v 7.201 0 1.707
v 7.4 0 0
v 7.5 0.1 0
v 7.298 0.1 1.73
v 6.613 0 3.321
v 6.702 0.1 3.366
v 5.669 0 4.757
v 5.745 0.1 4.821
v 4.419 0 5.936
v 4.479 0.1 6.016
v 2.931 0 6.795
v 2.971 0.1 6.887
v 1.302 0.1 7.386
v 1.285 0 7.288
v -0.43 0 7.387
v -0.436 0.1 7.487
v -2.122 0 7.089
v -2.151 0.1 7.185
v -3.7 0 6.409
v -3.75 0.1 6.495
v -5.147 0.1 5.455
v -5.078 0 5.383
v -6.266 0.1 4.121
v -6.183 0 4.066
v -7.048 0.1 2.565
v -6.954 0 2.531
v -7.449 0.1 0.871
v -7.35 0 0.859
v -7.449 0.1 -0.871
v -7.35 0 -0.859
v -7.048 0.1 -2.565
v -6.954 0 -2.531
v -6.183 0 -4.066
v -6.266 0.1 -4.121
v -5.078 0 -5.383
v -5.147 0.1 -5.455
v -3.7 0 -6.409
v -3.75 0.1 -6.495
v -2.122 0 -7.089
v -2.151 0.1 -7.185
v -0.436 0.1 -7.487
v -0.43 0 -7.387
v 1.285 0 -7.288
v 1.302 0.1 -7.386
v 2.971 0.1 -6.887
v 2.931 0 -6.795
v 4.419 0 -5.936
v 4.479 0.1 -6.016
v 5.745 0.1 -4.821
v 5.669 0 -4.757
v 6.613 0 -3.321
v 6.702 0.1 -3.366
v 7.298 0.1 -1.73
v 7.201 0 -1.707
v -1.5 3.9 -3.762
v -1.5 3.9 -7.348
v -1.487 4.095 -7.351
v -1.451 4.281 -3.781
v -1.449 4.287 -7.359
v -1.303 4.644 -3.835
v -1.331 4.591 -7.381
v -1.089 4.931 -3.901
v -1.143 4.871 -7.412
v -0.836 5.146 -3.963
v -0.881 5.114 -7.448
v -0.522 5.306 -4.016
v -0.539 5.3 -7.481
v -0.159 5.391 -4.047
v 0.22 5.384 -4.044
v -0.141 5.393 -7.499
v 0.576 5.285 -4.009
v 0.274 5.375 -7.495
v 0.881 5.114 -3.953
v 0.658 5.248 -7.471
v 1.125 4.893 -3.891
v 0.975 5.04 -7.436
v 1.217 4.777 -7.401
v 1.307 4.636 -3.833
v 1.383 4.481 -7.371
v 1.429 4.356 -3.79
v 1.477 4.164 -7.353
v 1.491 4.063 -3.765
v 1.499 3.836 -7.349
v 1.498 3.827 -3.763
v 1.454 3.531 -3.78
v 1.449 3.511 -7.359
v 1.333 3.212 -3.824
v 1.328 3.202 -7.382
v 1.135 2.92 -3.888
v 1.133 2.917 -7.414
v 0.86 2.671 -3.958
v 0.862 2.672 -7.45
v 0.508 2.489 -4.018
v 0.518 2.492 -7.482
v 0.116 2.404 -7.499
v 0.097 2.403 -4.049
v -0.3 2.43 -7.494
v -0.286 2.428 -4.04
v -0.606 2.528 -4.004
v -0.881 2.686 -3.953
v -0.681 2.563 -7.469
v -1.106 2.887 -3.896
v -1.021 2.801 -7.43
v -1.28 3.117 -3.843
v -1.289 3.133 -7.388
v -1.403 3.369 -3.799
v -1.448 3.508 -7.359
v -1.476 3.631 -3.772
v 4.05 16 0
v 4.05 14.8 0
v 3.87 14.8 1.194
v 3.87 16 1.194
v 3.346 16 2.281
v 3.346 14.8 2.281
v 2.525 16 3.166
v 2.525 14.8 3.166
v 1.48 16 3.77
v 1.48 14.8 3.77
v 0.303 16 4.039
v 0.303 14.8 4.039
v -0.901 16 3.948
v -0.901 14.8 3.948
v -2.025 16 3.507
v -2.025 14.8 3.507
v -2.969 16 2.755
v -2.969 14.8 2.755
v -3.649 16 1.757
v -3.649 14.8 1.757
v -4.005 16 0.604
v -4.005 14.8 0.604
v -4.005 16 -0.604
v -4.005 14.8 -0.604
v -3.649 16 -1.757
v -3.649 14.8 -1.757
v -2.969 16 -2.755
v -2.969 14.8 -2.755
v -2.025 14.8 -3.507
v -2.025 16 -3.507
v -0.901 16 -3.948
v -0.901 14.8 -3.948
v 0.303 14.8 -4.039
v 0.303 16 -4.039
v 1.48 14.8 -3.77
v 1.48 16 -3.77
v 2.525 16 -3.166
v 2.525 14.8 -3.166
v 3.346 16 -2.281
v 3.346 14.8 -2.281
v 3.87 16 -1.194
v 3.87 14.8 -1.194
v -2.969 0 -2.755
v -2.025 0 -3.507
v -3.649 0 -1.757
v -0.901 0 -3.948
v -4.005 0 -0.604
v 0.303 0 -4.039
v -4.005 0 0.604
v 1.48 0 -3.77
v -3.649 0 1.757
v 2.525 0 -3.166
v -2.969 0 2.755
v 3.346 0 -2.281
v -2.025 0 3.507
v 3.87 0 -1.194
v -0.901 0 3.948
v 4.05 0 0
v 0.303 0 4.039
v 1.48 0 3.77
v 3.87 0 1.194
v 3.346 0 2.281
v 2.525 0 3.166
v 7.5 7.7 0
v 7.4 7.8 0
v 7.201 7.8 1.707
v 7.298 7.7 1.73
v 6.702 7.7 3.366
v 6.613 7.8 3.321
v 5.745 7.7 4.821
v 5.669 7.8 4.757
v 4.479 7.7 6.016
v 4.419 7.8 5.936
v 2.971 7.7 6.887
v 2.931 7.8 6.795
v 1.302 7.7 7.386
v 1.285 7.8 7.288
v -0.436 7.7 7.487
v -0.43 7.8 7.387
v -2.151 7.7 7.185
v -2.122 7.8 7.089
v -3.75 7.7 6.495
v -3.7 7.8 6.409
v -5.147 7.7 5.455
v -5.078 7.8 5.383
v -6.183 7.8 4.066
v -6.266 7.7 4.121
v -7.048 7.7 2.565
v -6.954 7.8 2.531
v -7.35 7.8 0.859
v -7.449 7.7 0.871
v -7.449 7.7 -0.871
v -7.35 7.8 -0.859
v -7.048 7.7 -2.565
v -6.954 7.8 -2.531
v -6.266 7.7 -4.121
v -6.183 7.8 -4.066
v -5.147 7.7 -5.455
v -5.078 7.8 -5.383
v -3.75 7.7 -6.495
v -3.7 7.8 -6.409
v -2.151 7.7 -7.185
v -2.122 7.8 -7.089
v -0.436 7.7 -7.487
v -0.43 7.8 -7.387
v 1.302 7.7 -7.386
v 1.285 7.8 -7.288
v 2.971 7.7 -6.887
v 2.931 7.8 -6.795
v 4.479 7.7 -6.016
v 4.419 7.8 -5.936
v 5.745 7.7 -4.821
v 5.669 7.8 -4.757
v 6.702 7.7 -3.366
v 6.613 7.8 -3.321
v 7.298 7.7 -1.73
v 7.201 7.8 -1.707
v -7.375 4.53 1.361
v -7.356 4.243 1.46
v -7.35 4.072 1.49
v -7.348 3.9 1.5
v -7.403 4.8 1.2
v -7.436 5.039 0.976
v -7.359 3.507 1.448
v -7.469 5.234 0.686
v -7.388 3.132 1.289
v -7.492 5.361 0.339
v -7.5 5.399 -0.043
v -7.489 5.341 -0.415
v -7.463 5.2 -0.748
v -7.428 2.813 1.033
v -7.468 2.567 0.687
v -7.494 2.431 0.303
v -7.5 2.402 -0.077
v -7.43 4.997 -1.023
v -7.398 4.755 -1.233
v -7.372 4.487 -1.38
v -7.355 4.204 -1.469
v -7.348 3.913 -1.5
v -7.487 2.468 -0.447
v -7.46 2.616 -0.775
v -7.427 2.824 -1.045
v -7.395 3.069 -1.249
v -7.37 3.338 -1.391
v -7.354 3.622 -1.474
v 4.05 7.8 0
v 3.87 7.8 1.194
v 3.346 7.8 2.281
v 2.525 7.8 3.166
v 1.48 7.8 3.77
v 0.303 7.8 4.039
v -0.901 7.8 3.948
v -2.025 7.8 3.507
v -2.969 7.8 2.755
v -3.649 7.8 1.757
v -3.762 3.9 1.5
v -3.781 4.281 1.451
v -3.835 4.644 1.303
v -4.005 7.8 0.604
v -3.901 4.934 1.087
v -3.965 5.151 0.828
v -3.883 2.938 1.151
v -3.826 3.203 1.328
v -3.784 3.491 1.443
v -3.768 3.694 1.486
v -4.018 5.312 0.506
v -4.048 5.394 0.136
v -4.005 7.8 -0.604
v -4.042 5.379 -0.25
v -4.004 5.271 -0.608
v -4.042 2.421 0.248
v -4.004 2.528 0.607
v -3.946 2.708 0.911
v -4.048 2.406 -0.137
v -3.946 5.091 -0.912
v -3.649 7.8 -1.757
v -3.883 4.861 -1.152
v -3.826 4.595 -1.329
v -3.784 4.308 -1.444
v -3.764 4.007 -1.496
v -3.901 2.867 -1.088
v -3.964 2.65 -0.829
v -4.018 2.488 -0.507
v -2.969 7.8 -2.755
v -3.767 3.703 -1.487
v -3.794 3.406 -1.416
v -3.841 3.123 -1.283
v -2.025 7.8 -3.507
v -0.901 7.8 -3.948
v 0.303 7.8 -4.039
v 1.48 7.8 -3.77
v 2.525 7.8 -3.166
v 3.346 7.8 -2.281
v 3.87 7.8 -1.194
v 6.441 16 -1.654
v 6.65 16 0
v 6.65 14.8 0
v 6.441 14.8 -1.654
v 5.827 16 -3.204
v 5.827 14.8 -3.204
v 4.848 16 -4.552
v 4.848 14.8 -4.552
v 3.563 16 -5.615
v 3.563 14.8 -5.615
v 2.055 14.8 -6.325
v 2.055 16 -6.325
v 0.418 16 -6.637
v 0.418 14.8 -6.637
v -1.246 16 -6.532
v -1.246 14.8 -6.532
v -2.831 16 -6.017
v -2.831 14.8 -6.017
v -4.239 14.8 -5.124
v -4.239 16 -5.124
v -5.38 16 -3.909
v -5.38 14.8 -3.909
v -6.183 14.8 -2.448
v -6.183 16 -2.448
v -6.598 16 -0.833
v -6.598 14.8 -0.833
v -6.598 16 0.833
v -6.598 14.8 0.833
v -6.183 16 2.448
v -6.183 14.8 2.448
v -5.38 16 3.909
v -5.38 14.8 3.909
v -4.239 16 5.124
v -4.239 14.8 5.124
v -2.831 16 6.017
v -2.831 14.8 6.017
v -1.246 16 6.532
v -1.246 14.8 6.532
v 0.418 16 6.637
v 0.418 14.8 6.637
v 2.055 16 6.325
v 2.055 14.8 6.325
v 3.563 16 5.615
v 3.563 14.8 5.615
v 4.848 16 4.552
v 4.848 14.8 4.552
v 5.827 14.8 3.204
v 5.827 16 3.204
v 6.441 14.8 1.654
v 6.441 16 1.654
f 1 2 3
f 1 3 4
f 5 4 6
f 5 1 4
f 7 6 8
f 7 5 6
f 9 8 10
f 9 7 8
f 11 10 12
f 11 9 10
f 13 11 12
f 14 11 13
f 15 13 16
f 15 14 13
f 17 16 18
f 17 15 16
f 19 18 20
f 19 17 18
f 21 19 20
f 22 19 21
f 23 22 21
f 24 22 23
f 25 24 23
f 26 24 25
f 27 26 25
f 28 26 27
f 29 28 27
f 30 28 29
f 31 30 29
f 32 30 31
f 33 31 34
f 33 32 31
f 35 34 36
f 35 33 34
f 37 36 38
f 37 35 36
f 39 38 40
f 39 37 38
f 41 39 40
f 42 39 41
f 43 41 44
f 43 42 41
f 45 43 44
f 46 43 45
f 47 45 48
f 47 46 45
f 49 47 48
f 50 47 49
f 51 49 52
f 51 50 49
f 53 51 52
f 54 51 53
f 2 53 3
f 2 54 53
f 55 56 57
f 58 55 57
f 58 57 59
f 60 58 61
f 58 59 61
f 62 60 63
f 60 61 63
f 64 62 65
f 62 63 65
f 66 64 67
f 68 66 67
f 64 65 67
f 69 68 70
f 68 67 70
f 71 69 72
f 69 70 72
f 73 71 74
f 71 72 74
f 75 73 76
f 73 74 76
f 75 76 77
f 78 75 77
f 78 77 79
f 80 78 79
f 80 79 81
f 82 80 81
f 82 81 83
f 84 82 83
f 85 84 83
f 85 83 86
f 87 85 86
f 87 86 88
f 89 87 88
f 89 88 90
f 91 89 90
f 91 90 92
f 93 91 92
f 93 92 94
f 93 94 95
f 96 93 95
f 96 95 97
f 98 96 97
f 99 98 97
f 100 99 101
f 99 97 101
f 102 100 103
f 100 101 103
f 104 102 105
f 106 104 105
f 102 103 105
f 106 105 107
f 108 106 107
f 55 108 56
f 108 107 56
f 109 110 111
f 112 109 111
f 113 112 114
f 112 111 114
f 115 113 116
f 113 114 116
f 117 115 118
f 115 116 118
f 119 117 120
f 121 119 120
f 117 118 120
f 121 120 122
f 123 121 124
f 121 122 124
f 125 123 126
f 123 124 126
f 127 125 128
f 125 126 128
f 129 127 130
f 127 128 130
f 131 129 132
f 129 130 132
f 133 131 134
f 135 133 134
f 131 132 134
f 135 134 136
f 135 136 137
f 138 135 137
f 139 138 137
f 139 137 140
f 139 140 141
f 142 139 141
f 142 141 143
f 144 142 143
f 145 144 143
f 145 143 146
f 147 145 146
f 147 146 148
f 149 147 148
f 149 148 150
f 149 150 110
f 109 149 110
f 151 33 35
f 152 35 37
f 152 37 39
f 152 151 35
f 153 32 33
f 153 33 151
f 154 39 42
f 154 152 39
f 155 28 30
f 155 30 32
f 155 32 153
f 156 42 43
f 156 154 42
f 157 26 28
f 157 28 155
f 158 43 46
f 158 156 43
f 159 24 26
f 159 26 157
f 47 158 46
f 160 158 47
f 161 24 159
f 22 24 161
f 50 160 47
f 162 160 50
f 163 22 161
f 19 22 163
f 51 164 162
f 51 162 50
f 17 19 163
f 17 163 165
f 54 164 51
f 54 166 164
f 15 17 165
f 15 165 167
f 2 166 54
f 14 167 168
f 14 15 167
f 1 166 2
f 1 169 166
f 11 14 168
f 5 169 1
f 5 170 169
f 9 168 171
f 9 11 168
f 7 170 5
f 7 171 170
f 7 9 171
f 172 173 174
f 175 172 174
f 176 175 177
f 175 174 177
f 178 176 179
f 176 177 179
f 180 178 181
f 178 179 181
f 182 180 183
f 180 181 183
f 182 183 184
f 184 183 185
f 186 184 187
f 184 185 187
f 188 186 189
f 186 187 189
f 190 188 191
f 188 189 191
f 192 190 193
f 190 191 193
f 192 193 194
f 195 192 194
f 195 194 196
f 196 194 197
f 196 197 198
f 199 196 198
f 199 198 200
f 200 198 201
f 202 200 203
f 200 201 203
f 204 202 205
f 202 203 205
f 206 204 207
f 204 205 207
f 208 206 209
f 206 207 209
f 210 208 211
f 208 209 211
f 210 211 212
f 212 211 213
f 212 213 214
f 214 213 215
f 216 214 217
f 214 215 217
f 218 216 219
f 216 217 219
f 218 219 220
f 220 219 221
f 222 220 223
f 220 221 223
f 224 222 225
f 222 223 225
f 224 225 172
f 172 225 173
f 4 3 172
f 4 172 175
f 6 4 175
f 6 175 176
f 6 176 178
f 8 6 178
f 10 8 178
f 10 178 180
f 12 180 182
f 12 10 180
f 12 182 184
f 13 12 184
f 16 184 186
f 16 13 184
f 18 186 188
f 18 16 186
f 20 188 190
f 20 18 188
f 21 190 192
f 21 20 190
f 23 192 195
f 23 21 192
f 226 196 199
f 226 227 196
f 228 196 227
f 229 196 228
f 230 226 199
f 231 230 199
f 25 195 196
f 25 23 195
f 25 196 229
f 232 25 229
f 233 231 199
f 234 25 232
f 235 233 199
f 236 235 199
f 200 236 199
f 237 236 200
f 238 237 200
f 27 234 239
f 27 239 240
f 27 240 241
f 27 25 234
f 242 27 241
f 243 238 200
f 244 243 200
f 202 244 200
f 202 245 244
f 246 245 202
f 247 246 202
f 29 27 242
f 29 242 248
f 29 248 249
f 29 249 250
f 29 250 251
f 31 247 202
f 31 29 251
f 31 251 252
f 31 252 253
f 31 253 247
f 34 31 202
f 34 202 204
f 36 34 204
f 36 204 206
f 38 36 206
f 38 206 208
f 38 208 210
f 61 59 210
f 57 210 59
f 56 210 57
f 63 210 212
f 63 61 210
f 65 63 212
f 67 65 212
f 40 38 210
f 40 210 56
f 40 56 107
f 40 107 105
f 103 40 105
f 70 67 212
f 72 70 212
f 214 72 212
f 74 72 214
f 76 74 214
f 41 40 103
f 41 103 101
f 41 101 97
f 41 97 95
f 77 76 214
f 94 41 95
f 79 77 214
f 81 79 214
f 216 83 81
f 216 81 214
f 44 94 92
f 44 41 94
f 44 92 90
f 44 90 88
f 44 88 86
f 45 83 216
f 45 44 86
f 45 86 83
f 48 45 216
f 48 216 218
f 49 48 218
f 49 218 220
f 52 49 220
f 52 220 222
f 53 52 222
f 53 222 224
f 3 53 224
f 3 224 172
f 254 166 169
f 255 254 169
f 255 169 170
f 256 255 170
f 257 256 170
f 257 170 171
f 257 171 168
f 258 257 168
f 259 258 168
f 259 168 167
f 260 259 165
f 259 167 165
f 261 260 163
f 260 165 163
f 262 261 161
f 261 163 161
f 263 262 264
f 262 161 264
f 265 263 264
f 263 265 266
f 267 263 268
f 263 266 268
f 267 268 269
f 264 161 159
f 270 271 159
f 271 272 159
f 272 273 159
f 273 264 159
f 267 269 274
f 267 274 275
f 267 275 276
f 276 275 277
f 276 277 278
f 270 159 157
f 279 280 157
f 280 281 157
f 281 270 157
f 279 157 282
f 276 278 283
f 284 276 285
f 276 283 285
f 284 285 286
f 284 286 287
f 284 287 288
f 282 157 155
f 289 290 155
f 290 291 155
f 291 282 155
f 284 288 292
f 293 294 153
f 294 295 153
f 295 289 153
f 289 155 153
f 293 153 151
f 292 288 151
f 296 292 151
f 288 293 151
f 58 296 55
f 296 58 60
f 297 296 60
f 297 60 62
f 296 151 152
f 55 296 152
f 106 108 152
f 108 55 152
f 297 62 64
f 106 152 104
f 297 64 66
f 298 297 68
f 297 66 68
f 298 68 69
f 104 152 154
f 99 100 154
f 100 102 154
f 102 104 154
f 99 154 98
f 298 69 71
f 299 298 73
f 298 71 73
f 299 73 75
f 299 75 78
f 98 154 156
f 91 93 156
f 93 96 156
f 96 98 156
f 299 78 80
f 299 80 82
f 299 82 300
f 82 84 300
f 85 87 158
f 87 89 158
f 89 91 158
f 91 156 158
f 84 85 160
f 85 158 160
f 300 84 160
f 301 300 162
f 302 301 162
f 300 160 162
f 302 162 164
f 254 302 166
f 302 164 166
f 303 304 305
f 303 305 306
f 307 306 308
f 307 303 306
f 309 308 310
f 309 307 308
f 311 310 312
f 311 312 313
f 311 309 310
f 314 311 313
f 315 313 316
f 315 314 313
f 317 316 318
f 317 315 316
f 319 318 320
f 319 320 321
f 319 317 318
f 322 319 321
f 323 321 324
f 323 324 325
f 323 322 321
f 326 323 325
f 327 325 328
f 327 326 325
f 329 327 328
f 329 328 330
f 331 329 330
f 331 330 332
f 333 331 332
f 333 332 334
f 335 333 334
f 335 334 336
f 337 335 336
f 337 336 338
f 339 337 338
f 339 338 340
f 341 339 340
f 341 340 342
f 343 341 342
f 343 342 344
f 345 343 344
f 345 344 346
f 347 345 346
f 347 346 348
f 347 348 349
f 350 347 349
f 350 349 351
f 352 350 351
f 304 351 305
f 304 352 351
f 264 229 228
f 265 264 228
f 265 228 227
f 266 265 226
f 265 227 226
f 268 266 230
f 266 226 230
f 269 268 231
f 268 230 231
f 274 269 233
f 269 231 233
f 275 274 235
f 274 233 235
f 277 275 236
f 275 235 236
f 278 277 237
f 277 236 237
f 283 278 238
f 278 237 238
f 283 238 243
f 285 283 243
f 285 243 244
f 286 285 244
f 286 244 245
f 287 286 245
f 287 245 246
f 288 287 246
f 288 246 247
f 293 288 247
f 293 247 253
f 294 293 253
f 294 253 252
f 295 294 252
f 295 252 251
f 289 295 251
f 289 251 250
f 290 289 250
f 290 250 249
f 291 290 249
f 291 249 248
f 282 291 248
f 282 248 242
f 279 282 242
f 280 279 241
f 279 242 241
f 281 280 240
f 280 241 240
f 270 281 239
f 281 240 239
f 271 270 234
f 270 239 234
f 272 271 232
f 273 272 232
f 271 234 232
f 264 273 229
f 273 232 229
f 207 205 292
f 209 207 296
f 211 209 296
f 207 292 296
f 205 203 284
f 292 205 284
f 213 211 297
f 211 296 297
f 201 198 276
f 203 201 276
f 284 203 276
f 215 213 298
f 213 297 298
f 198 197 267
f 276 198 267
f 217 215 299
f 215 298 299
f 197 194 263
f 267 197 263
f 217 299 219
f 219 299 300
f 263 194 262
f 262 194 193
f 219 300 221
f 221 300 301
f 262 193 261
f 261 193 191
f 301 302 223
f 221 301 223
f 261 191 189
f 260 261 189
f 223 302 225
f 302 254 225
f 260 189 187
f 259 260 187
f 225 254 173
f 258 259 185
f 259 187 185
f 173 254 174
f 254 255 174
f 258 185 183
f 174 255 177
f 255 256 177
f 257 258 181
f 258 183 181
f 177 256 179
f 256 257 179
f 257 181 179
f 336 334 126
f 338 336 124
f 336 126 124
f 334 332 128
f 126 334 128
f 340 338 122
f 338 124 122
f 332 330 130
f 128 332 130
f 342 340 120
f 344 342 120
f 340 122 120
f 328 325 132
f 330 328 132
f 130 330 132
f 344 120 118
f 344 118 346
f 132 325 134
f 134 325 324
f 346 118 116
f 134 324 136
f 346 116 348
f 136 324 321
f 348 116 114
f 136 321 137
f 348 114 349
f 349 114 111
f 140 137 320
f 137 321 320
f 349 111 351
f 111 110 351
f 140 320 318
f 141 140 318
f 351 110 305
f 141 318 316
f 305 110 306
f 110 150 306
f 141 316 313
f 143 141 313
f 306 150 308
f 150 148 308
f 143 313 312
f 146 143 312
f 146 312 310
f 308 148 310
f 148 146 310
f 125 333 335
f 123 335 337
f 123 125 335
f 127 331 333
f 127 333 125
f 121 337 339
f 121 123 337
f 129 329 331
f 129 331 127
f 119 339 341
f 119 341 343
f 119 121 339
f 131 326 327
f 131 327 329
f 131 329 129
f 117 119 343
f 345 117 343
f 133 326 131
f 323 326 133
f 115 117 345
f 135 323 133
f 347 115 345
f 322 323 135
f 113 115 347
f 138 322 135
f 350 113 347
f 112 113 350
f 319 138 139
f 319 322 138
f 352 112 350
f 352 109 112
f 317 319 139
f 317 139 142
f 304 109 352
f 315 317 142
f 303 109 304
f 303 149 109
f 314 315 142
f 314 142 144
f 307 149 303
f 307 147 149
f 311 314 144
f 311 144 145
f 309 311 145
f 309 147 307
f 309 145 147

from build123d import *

# Parameters (mm, degrees)
P_IDAT_START            = 7.8
SKICA1_R                = 2.5
P_IDAT_VYSUNUT_M1_DEPTH = 7
SKICA2_R                = 3.5
SKICA2_R_2              = 2.5
P_IDAT_VYSUNUT_M2_DEPTH = 7.8
SKICA3_R                = 3.5
SKICA3_R_2              = 2.5
P_IDAT_VYSUNUT_M3_DEPTH = 1.2
SKICA5_R                = 7.5
SKICA5_R_2              = 3.5
P_IDAT_VYSUNUT_M4_DEPTH = 1.2
SKICA6_R                = 7.5
SKICA6_R_2              = 3.5
P_IDAT_VYSUNUT_M5_DEPTH = 7.8
ZKOSEN_1_SIZE           = 0.1
ZKOSEN_2_SIZE           = 0.1
ZKOSEN_3_SIZE           = 0.1
SKETCH8_OUTSIDE_W       = 22.314
SKETCH8_OUTSIDE_H       = 22.314
SKETCH8_OUTSIDE_R       = 6.65
CUT_EXTRUDE2_DEPTH      = 5
SKETCH19_R              = 1.5
CUT_EXTRUDE6_DEPTH      = 5
SKETCH20_R              = 1.5
CUT_EXTRUDE7_DEPTH      = 5
SKETCH7_R               = 4.05
CUT_EXTRUDE9_DEPTH      = 20
SKETCH27_R              = 7.4
CUT_EXTRUDE12_DEPTH     = 7


with BuildPart() as part:
    # Skica1 → Přidat vysunutím1 (new body)
    with BuildSketch(Plane(origin=(0, 0, 0), x_dir=(1, 0, 0), z_dir=(0, 1, 0)).offset(P_IDAT_START)):
        with BuildLine():
            ThreePointArc((-5.730143195, 1.098270155), (-5.09645097, 1.530497044), (-5.387174672, 2.240331989))
            ThreePointArc((-5.387174672, 2.240331989), (-5.468060657, 2.292707421), (-5.540463547, 2.356296335))
            ThreePointArc((-5.540463547, 2.356296335), (-5.573874331, 2.399596558), (-5.596043873, 2.44959357))
            ThreePointArc((-5.596043873, 2.44959357), (-5.50369925, 2.650567912), (-5.404139771, 2.848067596))
            ThreePointArc((-5.404139771, 2.848067596), (-5.351227535, 2.86190541), (-5.296542742, 2.862779021))
            ThreePointArc((-5.296542742, 2.862779021), (-5.201685094, 2.845815675), (-5.110305882, 2.815228615))
            ThreePointArc((-5.110305882, 2.815228615), (-4.374063308, 3.030479148), (-4.431206919, 3.795410862))
            ThreePointArc((-4.431206919, 3.795410862), (-4.491949163, 3.870218002), (-4.541158349, 3.953068377))
            ThreePointArc((-4.541158349, 3.953068377), (-4.559553388, 4.004573836), (-4.565187949, 4.058974585))
            ThreePointArc((-4.565187949, 4.058974585), (-4.415258506, 4.221576484), (-4.259541056, 4.378644275))
            ThreePointArc((-4.259541056, 4.378644275), (-4.204942409, 4.375454038), (-4.15266412, 4.359386362))
            ThreePointArc((-4.15266412, 4.359386362), (-4.067691098, 4.313940635), (-3.990236225, 4.256612884))
            ThreePointArc((-3.990236225, 4.256612884), (-3.223511854, 4.233816838), (-3.041481758, 4.978968476))
            ThreePointArc((-3.041481758, 4.978968476), (-3.076134388, 5.06888468), (-3.097332931, 5.162886543))
            ThreePointArc((-3.097332931, 5.162886543), (-3.09891159, 5.217555525), (-3.08745962, 5.271034888))
            ThreePointArc((-3.08745962, 5.271034888), (-2.894621497, 5.379347737), (-2.697988784, 5.480608745))
            ThreePointArc((-2.697988784, 5.480608745), (-2.647048223, 5.460702739), (-2.6022938, 5.429266591))
            ThreePointArc((-2.6022938, 5.429266591), (-2.535523156, 5.359787029), (-2.479574443, 5.281330225))
            ThreePointArc((-2.479574443, 5.281330225), (-1.7574206, 5.022719037), (-1.354035171, 5.675149965))
            ThreePointArc((-1.354035171, 5.675149965), (-1.359206146, 5.771373608), (-1.350318985, 5.867325402))
            ThreePointArc((-1.350318985, 5.867325402), (-1.334926735, 5.919806527), (-1.307509232, 5.967129569))
            ThreePointArc((-1.307509232, 5.967129569), (-1.090638767, 6.010550954), (-0.872338572, 6.046093045))
            ThreePointArc((-0.872338572, 6.046093045), (-0.830042514, 6.01141981), (-0.797192832, 5.967692379))
            ThreePointArc((-0.797192832, 5.967692379), (-0.755160541, 5.880980125), (-0.726194639, 5.789074167))
            ThreePointArc((-0.726194639, 5.789074167), (-0.119300773, 5.319962501), (0.465953812, 5.815808234))
            ThreePointArc((0.465953812, 5.815808234), (0.490770664, 5.908920276), (0.528873591, 5.997429571))
            ThreePointArc((0.528873591, 5.997429571), (0.55973005, 6.04258562), (0.600429269, 6.079120034))
            ThreePointArc((0.600429269, 6.079120034), (0.820103284, 6.053399565), (1.038702217, 6.019743632))
            ThreePointArc((1.038702217, 6.019743632), (1.06821354, 5.973697225), (1.085942924, 5.921958857))
            ThreePointArc((1.085942924, 5.921958857), (1.099122448, 5.826501911), (1.098270155, 5.730143195))
            ThreePointArc((1.098270155, 5.730143195), (1.530497044, 5.09645097), (2.240331989, 5.387174672))
            ThreePointArc((2.240331989, 5.387174672), (2.292707421, 5.468060657), (2.356296335, 5.540463547))
            ThreePointArc((2.356296335, 5.540463547), (2.399596558, 5.573874331), (2.44959357, 5.596043873))
            ThreePointArc((2.44959357, 5.596043873), (2.650567912, 5.50369925), (2.848067596, 5.404139771))
            ThreePointArc((2.848067596, 5.404139771), (2.86190541, 5.351227535), (2.862779021, 5.296542742))
            ThreePointArc((2.862779021, 5.296542742), (2.845815675, 5.201685094), (2.815228615, 5.110305882))
            ThreePointArc((2.815228615, 5.110305882), (3.030479148, 4.374063308), (3.795410862, 4.431206919))
            ThreePointArc((3.795410862, 4.431206919), (3.870218002, 4.491949163), (3.953068377, 4.541158349))
            ThreePointArc((3.953068377, 4.541158349), (4.004573836, 4.559553388), (4.058974585, 4.565187949))
            ThreePointArc((4.058974585, 4.565187949), (4.221576484, 4.415258506), (4.378644275, 4.259541056))
            ThreePointArc((4.378644275, 4.259541056), (4.375454038, 4.204942409), (4.359386362, 4.15266412))
            ThreePointArc((4.359386362, 4.15266412), (4.313940635, 4.067691098), (4.256612884, 3.990236225))
            ThreePointArc((4.256612884, 3.990236225), (4.233816838, 3.223511854), (4.978968476, 3.041481758))
            ThreePointArc((4.978968476, 3.041481758), (5.06888468, 3.076134388), (5.162886543, 3.097332931))
            ThreePointArc((5.162886543, 3.097332931), (5.217555525, 3.09891159), (5.271034888, 3.08745962))
            ThreePointArc((5.271034888, 3.08745962), (5.379347737, 2.894621497), (5.480608745, 2.697988784))
            ThreePointArc((5.480608745, 2.697988784), (5.460702739, 2.647048223), (5.429266591, 2.6022938))
            ThreePointArc((5.429266591, 2.6022938), (5.359787029, 2.535523156), (5.281330225, 2.479574443))
            ThreePointArc((5.281330225, 2.479574443), (5.022719037, 1.7574206), (5.675149965, 1.354035171))
            ThreePointArc((5.675149965, 1.354035171), (5.771373608, 1.359206146), (5.867325402, 1.350318985))
            ThreePointArc((5.867325402, 1.350318985), (5.919806527, 1.334926735), (5.967129569, 1.307509232))
            ThreePointArc((5.967129569, 1.307509232), (6.010550954, 1.090638767), (6.046093045, 0.872338572))
            ThreePointArc((6.046093045, 0.872338572), (6.01141981, 0.830042514), (5.967692379, 0.797192832))
            ThreePointArc((5.967692379, 0.797192832), (5.880980125, 0.755160541), (5.789074167, 0.726194639))
            ThreePointArc((5.789074167, 0.726194639), (5.319962501, 0.119300773), (5.815808234, -0.465953812))
            ThreePointArc((5.815808234, -0.465953812), (5.908920276, -0.490770664), (5.997429571, -0.528873591))
            ThreePointArc((5.997429571, -0.528873591), (6.04258562, -0.55973005), (6.079120034, -0.600429269))
            ThreePointArc((6.079120034, -0.600429269), (6.053399565, -0.820103284), (6.019743632, -1.038702217))
            ThreePointArc((6.019743632, -1.038702217), (5.973697225, -1.06821354), (5.921958857, -1.085942924))
            ThreePointArc((5.921958857, -1.085942924), (5.826501911, -1.099122448), (5.730143195, -1.098270155))
            ThreePointArc((5.730143195, -1.098270155), (5.09645097, -1.530497044), (5.387174672, -2.240331989))
            ThreePointArc((5.387174672, -2.240331989), (5.468060657, -2.292707421), (5.540463547, -2.356296335))
            ThreePointArc((5.540463547, -2.356296335), (5.573874331, -2.399596558), (5.596043873, -2.44959357))
            ThreePointArc((5.596043873, -2.44959357), (5.50369925, -2.650567911), (5.404139771, -2.848067596))
            ThreePointArc((5.404139771, -2.848067596), (5.351227535, -2.86190541), (5.296542742, -2.862779021))
            ThreePointArc((5.296542742, -2.862779021), (5.201685094, -2.845815675), (5.110305882, -2.815228615))
            ThreePointArc((5.110305882, -2.815228615), (4.374063308, -3.030479148), (4.431206919, -3.795410862))
            ThreePointArc((4.431206919, -3.795410862), (4.491949163, -3.870218002), (4.541158349, -3.953068377))
            ThreePointArc((4.541158349, -3.953068377), (4.559553388, -4.004573836), (4.565187949, -4.058974585))
            ThreePointArc((4.565187949, -4.058974585), (4.415258506, -4.221576484), (4.259541056, -4.378644275))
            ThreePointArc((4.259541056, -4.378644275), (4.204942409, -4.375454038), (4.15266412, -4.359386362))
            ThreePointArc((4.15266412, -4.359386362), (4.067691098, -4.313940635), (3.990236225, -4.256612884))
            ThreePointArc((3.990236225, -4.256612884), (3.223511854, -4.233816838), (3.041481758, -4.978968476))
            ThreePointArc((3.041481758, -4.978968476), (3.076134388, -5.06888468), (3.097332931, -5.162886543))
            ThreePointArc((3.097332931, -5.162886543), (3.09891159, -5.217555525), (3.08745962, -5.271034888))
            ThreePointArc((3.08745962, -5.271034888), (2.894621497, -5.379347737), (2.697988784, -5.480608745))
            ThreePointArc((2.697988784, -5.480608745), (2.647048223, -5.460702739), (2.6022938, -5.429266591))
            ThreePointArc((2.6022938, -5.429266591), (2.535523156, -5.359787029), (2.479574443, -5.281330225))
            ThreePointArc((2.479574443, -5.281330225), (1.7574206, -5.022719037), (1.354035171, -5.675149965))
            ThreePointArc((1.354035171, -5.675149965), (1.359206146, -5.771373608), (1.350318985, -5.867325402))
            ThreePointArc((1.350318985, -5.867325402), (1.334926735, -5.919806527), (1.307509232, -5.967129569))
            ThreePointArc((1.307509232, -5.967129569), (1.090638767, -6.010550954), (0.872338572, -6.046093045))
            ThreePointArc((0.872338572, -6.046093045), (0.830042514, -6.01141981), (0.797192832, -5.967692379))
            ThreePointArc((0.797192832, -5.967692379), (0.755160541, -5.880980125), (0.726194639, -5.789074167))
            ThreePointArc((0.726194639, -5.789074167), (0.119300773, -5.319962501), (-0.465953812, -5.815808234))
            ThreePointArc((-0.465953812, -5.815808234), (-0.490770664, -5.908920276), (-0.528873591, -5.997429571))
            ThreePointArc((-0.528873591, -5.997429571), (-0.55973005, -6.04258562), (-0.600429269, -6.079120034))
            ThreePointArc((-0.600429269, -6.079120034), (-0.820103284, -6.053399565), (-1.038702217, -6.019743632))
            ThreePointArc((-1.038702217, -6.019743632), (-1.06821354, -5.973697225), (-1.085942924, -5.921958857))
            ThreePointArc((-1.085942924, -5.921958857), (-1.099122448, -5.826501911), (-1.098270155, -5.730143195))
            ThreePointArc((-1.098270155, -5.730143195), (-1.530497044, -5.09645097), (-2.240331989, -5.387174672))
            ThreePointArc((-2.240331989, -5.387174672), (-2.292707421, -5.468060657), (-2.356296335, -5.540463547))
            ThreePointArc((-2.356296335, -5.540463547), (-2.399596558, -5.573874331), (-2.44959357, -5.596043873))
            ThreePointArc((-2.44959357, -5.596043873), (-2.650567912, -5.50369925), (-2.848067596, -5.404139771))
            ThreePointArc((-2.848067596, -5.404139771), (-2.86190541, -5.351227535), (-2.862779021, -5.296542742))
            ThreePointArc((-2.862779021, -5.296542742), (-2.845815675, -5.201685094), (-2.815228615, -5.110305882))
            ThreePointArc((-2.815228615, -5.110305882), (-3.030479148, -4.374063308), (-3.795410862, -4.431206919))
            ThreePointArc((-3.795410862, -4.431206919), (-3.870218002, -4.491949163), (-3.953068377, -4.541158349))
            ThreePointArc((-3.953068377, -4.541158349), (-4.004573836, -4.559553388), (-4.058974585, -4.565187949))
            ThreePointArc((-4.058974585, -4.565187949), (-4.221576484, -4.415258506), (-4.378644275, -4.259541056))
            ThreePointArc((-4.378644275, -4.259541056), (-4.375454038, -4.204942409), (-4.359386362, -4.15266412))
            ThreePointArc((-4.359386362, -4.15266412), (-4.313940635, -4.067691098), (-4.256612884, -3.990236225))
            ThreePointArc((-4.256612884, -3.990236225), (-4.233816838, -3.223511854), (-4.978968476, -3.041481758))
            ThreePointArc((-4.978968476, -3.041481758), (-5.06888468, -3.076134388), (-5.162886543, -3.097332931))
            ThreePointArc((-5.162886543, -3.097332931), (-5.217555525, -3.09891159), (-5.271034888, -3.08745962))
            ThreePointArc((-5.271034888, -3.08745962), (-5.379347737, -2.894621497), (-5.480608745, -2.697988784))
            ThreePointArc((-5.480608745, -2.697988784), (-5.460702739, -2.647048223), (-5.429266591, -2.6022938))
            ThreePointArc((-5.429266591, -2.6022938), (-5.359787029, -2.535523156), (-5.281330225, -2.479574443))
            ThreePointArc((-5.281330225, -2.479574443), (-5.022719037, -1.7574206), (-5.675149965, -1.354035171))
            ThreePointArc((-5.675149965, -1.354035171), (-5.771373608, -1.359206146), (-5.867325402, -1.350318985))
            ThreePointArc((-5.867325402, -1.350318985), (-5.919806527, -1.334926735), (-5.967129569, -1.307509232))
            ThreePointArc((-5.967129569, -1.307509232), (-6.010550954, -1.090638767), (-6.046093045, -0.872338572))
            ThreePointArc((-6.046093045, -0.872338572), (-6.01141981, -0.830042514), (-5.967692379, -0.797192832))
            ThreePointArc((-5.967692379, -0.797192832), (-5.880980125, -0.755160541), (-5.789074167, -0.726194639))
            ThreePointArc((-5.789074167, -0.726194639), (-5.319962501, -0.119300773), (-5.815808234, 0.465953812))
            ThreePointArc((-5.815808234, 0.465953812), (-5.908920276, 0.490770664), (-5.997429571, 0.528873591))
            ThreePointArc((-5.997429571, 0.528873591), (-6.04258562, 0.55973005), (-6.079120034, 0.600429269))
            ThreePointArc((-6.079120034, 0.600429269), (-6.053399565, 0.820103284), (-6.019743632, 1.038702217))
            ThreePointArc((-6.019743632, 1.038702217), (-5.973697225, 1.06821354), (-5.921958857, 1.085942924))
            ThreePointArc((-5.921958857, 1.085942924), (-5.826501911, 1.099122448), (-5.730143195, 1.098270155))
        make_face()
        Circle(SKICA1_R, mode=Mode.SUBTRACT)
    extrude(amount=P_IDAT_VYSUNUT_M1_DEPTH)

    # Skica2 → Přidat vysunutím2 (add)
    with BuildSketch(Plane.XZ.offset(-7.8)):
        Circle(SKICA2_R)
        Circle(SKICA2_R_2, mode=Mode.SUBTRACT)
    extrude(amount=P_IDAT_VYSUNUT_M2_DEPTH)

    # Skica3 → Přidat vysunutím3 (add)
    with BuildSketch(Plane(origin=(0, 14.8, 0), x_dir=(1, 0, 0), z_dir=(0, 1, 0))):
        Circle(SKICA3_R)
        Circle(SKICA3_R_2, mode=Mode.SUBTRACT)
    extrude(amount=P_IDAT_VYSUNUT_M3_DEPTH)

    # Zkosení2
    zkosen_2_edges = [part.edges().sort_by_distance(p)[0] for p in [
        (-2.5, 0, 0),
        (-2.5, 16, 0),
    ]]
    chamfer(zkosen_2_edges, length=ZKOSEN_2_SIZE)


with BuildPart() as body_2:
    # Skica5 → Přidat vysunutím4 (new body)
    with BuildSketch(Plane(origin=(0, 16, 0), x_dir=(1, 0, 0), z_dir=(0, 1, 0))):
        Circle(SKICA5_R)
        Circle(SKICA5_R_2, mode=Mode.SUBTRACT)
    extrude(amount=-P_IDAT_VYSUNUT_M4_DEPTH)

    # Zkosení1
    zkosen_1_edges = [body_2.edges().sort_by_distance(p)[0] for p in [
        (-7.5, 16, 0),
        (-7.5, 14.8, 0),
    ]]
    chamfer(zkosen_1_edges, length=ZKOSEN_1_SIZE)

    # Sketch8 outside → Cut-Extrude2 (cut)
    with BuildSketch(Plane(origin=(0, 16, 0), x_dir=(1, 0, 0), z_dir=(0, 1, 0))):
        Rectangle(SKETCH8_OUTSIDE_W, SKETCH8_OUTSIDE_H)
        Circle(SKETCH8_OUTSIDE_R, mode=Mode.SUBTRACT)
    extrude(amount=-CUT_EXTRUDE2_DEPTH, mode=Mode.SUBTRACT)


with BuildPart() as body_3:
    # Skica6 → Přidat vysunutím5 (new body)
    with BuildSketch(Plane.XZ):
        Circle(SKICA6_R)
        Circle(SKICA6_R_2, mode=Mode.SUBTRACT)
    extrude(amount=-P_IDAT_VYSUNUT_M5_DEPTH)

    # Zkosení3
    zkosen_3_edges = [body_3.edges().sort_by_distance(p)[0] for p in [
        (-7.5, 0, 0),
        (-7.5, 7.8, 0),
    ]]
    chamfer(zkosen_3_edges, length=ZKOSEN_3_SIZE)

    # Sketch19 → Cut-Extrude6 (cut)
    with BuildSketch(Plane(origin=(0, 0, -7.5), x_dir=(-1, 0, 0), z_dir=(0, 0, -1))):
        with Locations((0, 3.9)):
            Circle(SKETCH19_R)
    extrude(amount=-CUT_EXTRUDE6_DEPTH, mode=Mode.SUBTRACT)

    # Sketch20 → Cut-Extrude7 (cut)
    with BuildSketch(Plane.ZY.offset(7.5)):
        with Locations((0, 3.9)):
            Circle(SKETCH20_R)
    extrude(amount=-CUT_EXTRUDE7_DEPTH, mode=Mode.SUBTRACT)


with BuildPart() as cut_extrude9_tool:
    # Sketch7 → Cut-Extrude9 (new body)
    with BuildSketch(Plane.XZ):
        Circle(SKETCH7_R)
    extrude(amount=-CUT_EXTRUDE9_DEPTH)


with BuildPart() as part_1:
    add(part.part)

    # Cut-Extrude9: cut by cut_extrude9_tool
    add(cut_extrude9_tool.part, mode=Mode.SUBTRACT)

    # Sketch27 → Cut-Extrude12 (cut)
    with BuildSketch(Plane(origin=(0, 7.8, 0), x_dir=(1, 0, 0), z_dir=(0, 1, 0))):
        Circle(SKETCH27_R)
    extrude(amount=CUT_EXTRUDE12_DEPTH, mode=Mode.SUBTRACT)


with BuildPart() as body_2_1:
    add(body_2.part)

    # Cut-Extrude9: cut by cut_extrude9_tool
    add(cut_extrude9_tool.part, mode=Mode.SUBTRACT)


with BuildPart() as body_3_1:
    add(body_3.part)

    # Cut-Extrude9: cut by cut_extrude9_tool
    add(cut_extrude9_tool.part, mode=Mode.SUBTRACT)


solid = Compound([body_2_1.part, body_3_1.part])
